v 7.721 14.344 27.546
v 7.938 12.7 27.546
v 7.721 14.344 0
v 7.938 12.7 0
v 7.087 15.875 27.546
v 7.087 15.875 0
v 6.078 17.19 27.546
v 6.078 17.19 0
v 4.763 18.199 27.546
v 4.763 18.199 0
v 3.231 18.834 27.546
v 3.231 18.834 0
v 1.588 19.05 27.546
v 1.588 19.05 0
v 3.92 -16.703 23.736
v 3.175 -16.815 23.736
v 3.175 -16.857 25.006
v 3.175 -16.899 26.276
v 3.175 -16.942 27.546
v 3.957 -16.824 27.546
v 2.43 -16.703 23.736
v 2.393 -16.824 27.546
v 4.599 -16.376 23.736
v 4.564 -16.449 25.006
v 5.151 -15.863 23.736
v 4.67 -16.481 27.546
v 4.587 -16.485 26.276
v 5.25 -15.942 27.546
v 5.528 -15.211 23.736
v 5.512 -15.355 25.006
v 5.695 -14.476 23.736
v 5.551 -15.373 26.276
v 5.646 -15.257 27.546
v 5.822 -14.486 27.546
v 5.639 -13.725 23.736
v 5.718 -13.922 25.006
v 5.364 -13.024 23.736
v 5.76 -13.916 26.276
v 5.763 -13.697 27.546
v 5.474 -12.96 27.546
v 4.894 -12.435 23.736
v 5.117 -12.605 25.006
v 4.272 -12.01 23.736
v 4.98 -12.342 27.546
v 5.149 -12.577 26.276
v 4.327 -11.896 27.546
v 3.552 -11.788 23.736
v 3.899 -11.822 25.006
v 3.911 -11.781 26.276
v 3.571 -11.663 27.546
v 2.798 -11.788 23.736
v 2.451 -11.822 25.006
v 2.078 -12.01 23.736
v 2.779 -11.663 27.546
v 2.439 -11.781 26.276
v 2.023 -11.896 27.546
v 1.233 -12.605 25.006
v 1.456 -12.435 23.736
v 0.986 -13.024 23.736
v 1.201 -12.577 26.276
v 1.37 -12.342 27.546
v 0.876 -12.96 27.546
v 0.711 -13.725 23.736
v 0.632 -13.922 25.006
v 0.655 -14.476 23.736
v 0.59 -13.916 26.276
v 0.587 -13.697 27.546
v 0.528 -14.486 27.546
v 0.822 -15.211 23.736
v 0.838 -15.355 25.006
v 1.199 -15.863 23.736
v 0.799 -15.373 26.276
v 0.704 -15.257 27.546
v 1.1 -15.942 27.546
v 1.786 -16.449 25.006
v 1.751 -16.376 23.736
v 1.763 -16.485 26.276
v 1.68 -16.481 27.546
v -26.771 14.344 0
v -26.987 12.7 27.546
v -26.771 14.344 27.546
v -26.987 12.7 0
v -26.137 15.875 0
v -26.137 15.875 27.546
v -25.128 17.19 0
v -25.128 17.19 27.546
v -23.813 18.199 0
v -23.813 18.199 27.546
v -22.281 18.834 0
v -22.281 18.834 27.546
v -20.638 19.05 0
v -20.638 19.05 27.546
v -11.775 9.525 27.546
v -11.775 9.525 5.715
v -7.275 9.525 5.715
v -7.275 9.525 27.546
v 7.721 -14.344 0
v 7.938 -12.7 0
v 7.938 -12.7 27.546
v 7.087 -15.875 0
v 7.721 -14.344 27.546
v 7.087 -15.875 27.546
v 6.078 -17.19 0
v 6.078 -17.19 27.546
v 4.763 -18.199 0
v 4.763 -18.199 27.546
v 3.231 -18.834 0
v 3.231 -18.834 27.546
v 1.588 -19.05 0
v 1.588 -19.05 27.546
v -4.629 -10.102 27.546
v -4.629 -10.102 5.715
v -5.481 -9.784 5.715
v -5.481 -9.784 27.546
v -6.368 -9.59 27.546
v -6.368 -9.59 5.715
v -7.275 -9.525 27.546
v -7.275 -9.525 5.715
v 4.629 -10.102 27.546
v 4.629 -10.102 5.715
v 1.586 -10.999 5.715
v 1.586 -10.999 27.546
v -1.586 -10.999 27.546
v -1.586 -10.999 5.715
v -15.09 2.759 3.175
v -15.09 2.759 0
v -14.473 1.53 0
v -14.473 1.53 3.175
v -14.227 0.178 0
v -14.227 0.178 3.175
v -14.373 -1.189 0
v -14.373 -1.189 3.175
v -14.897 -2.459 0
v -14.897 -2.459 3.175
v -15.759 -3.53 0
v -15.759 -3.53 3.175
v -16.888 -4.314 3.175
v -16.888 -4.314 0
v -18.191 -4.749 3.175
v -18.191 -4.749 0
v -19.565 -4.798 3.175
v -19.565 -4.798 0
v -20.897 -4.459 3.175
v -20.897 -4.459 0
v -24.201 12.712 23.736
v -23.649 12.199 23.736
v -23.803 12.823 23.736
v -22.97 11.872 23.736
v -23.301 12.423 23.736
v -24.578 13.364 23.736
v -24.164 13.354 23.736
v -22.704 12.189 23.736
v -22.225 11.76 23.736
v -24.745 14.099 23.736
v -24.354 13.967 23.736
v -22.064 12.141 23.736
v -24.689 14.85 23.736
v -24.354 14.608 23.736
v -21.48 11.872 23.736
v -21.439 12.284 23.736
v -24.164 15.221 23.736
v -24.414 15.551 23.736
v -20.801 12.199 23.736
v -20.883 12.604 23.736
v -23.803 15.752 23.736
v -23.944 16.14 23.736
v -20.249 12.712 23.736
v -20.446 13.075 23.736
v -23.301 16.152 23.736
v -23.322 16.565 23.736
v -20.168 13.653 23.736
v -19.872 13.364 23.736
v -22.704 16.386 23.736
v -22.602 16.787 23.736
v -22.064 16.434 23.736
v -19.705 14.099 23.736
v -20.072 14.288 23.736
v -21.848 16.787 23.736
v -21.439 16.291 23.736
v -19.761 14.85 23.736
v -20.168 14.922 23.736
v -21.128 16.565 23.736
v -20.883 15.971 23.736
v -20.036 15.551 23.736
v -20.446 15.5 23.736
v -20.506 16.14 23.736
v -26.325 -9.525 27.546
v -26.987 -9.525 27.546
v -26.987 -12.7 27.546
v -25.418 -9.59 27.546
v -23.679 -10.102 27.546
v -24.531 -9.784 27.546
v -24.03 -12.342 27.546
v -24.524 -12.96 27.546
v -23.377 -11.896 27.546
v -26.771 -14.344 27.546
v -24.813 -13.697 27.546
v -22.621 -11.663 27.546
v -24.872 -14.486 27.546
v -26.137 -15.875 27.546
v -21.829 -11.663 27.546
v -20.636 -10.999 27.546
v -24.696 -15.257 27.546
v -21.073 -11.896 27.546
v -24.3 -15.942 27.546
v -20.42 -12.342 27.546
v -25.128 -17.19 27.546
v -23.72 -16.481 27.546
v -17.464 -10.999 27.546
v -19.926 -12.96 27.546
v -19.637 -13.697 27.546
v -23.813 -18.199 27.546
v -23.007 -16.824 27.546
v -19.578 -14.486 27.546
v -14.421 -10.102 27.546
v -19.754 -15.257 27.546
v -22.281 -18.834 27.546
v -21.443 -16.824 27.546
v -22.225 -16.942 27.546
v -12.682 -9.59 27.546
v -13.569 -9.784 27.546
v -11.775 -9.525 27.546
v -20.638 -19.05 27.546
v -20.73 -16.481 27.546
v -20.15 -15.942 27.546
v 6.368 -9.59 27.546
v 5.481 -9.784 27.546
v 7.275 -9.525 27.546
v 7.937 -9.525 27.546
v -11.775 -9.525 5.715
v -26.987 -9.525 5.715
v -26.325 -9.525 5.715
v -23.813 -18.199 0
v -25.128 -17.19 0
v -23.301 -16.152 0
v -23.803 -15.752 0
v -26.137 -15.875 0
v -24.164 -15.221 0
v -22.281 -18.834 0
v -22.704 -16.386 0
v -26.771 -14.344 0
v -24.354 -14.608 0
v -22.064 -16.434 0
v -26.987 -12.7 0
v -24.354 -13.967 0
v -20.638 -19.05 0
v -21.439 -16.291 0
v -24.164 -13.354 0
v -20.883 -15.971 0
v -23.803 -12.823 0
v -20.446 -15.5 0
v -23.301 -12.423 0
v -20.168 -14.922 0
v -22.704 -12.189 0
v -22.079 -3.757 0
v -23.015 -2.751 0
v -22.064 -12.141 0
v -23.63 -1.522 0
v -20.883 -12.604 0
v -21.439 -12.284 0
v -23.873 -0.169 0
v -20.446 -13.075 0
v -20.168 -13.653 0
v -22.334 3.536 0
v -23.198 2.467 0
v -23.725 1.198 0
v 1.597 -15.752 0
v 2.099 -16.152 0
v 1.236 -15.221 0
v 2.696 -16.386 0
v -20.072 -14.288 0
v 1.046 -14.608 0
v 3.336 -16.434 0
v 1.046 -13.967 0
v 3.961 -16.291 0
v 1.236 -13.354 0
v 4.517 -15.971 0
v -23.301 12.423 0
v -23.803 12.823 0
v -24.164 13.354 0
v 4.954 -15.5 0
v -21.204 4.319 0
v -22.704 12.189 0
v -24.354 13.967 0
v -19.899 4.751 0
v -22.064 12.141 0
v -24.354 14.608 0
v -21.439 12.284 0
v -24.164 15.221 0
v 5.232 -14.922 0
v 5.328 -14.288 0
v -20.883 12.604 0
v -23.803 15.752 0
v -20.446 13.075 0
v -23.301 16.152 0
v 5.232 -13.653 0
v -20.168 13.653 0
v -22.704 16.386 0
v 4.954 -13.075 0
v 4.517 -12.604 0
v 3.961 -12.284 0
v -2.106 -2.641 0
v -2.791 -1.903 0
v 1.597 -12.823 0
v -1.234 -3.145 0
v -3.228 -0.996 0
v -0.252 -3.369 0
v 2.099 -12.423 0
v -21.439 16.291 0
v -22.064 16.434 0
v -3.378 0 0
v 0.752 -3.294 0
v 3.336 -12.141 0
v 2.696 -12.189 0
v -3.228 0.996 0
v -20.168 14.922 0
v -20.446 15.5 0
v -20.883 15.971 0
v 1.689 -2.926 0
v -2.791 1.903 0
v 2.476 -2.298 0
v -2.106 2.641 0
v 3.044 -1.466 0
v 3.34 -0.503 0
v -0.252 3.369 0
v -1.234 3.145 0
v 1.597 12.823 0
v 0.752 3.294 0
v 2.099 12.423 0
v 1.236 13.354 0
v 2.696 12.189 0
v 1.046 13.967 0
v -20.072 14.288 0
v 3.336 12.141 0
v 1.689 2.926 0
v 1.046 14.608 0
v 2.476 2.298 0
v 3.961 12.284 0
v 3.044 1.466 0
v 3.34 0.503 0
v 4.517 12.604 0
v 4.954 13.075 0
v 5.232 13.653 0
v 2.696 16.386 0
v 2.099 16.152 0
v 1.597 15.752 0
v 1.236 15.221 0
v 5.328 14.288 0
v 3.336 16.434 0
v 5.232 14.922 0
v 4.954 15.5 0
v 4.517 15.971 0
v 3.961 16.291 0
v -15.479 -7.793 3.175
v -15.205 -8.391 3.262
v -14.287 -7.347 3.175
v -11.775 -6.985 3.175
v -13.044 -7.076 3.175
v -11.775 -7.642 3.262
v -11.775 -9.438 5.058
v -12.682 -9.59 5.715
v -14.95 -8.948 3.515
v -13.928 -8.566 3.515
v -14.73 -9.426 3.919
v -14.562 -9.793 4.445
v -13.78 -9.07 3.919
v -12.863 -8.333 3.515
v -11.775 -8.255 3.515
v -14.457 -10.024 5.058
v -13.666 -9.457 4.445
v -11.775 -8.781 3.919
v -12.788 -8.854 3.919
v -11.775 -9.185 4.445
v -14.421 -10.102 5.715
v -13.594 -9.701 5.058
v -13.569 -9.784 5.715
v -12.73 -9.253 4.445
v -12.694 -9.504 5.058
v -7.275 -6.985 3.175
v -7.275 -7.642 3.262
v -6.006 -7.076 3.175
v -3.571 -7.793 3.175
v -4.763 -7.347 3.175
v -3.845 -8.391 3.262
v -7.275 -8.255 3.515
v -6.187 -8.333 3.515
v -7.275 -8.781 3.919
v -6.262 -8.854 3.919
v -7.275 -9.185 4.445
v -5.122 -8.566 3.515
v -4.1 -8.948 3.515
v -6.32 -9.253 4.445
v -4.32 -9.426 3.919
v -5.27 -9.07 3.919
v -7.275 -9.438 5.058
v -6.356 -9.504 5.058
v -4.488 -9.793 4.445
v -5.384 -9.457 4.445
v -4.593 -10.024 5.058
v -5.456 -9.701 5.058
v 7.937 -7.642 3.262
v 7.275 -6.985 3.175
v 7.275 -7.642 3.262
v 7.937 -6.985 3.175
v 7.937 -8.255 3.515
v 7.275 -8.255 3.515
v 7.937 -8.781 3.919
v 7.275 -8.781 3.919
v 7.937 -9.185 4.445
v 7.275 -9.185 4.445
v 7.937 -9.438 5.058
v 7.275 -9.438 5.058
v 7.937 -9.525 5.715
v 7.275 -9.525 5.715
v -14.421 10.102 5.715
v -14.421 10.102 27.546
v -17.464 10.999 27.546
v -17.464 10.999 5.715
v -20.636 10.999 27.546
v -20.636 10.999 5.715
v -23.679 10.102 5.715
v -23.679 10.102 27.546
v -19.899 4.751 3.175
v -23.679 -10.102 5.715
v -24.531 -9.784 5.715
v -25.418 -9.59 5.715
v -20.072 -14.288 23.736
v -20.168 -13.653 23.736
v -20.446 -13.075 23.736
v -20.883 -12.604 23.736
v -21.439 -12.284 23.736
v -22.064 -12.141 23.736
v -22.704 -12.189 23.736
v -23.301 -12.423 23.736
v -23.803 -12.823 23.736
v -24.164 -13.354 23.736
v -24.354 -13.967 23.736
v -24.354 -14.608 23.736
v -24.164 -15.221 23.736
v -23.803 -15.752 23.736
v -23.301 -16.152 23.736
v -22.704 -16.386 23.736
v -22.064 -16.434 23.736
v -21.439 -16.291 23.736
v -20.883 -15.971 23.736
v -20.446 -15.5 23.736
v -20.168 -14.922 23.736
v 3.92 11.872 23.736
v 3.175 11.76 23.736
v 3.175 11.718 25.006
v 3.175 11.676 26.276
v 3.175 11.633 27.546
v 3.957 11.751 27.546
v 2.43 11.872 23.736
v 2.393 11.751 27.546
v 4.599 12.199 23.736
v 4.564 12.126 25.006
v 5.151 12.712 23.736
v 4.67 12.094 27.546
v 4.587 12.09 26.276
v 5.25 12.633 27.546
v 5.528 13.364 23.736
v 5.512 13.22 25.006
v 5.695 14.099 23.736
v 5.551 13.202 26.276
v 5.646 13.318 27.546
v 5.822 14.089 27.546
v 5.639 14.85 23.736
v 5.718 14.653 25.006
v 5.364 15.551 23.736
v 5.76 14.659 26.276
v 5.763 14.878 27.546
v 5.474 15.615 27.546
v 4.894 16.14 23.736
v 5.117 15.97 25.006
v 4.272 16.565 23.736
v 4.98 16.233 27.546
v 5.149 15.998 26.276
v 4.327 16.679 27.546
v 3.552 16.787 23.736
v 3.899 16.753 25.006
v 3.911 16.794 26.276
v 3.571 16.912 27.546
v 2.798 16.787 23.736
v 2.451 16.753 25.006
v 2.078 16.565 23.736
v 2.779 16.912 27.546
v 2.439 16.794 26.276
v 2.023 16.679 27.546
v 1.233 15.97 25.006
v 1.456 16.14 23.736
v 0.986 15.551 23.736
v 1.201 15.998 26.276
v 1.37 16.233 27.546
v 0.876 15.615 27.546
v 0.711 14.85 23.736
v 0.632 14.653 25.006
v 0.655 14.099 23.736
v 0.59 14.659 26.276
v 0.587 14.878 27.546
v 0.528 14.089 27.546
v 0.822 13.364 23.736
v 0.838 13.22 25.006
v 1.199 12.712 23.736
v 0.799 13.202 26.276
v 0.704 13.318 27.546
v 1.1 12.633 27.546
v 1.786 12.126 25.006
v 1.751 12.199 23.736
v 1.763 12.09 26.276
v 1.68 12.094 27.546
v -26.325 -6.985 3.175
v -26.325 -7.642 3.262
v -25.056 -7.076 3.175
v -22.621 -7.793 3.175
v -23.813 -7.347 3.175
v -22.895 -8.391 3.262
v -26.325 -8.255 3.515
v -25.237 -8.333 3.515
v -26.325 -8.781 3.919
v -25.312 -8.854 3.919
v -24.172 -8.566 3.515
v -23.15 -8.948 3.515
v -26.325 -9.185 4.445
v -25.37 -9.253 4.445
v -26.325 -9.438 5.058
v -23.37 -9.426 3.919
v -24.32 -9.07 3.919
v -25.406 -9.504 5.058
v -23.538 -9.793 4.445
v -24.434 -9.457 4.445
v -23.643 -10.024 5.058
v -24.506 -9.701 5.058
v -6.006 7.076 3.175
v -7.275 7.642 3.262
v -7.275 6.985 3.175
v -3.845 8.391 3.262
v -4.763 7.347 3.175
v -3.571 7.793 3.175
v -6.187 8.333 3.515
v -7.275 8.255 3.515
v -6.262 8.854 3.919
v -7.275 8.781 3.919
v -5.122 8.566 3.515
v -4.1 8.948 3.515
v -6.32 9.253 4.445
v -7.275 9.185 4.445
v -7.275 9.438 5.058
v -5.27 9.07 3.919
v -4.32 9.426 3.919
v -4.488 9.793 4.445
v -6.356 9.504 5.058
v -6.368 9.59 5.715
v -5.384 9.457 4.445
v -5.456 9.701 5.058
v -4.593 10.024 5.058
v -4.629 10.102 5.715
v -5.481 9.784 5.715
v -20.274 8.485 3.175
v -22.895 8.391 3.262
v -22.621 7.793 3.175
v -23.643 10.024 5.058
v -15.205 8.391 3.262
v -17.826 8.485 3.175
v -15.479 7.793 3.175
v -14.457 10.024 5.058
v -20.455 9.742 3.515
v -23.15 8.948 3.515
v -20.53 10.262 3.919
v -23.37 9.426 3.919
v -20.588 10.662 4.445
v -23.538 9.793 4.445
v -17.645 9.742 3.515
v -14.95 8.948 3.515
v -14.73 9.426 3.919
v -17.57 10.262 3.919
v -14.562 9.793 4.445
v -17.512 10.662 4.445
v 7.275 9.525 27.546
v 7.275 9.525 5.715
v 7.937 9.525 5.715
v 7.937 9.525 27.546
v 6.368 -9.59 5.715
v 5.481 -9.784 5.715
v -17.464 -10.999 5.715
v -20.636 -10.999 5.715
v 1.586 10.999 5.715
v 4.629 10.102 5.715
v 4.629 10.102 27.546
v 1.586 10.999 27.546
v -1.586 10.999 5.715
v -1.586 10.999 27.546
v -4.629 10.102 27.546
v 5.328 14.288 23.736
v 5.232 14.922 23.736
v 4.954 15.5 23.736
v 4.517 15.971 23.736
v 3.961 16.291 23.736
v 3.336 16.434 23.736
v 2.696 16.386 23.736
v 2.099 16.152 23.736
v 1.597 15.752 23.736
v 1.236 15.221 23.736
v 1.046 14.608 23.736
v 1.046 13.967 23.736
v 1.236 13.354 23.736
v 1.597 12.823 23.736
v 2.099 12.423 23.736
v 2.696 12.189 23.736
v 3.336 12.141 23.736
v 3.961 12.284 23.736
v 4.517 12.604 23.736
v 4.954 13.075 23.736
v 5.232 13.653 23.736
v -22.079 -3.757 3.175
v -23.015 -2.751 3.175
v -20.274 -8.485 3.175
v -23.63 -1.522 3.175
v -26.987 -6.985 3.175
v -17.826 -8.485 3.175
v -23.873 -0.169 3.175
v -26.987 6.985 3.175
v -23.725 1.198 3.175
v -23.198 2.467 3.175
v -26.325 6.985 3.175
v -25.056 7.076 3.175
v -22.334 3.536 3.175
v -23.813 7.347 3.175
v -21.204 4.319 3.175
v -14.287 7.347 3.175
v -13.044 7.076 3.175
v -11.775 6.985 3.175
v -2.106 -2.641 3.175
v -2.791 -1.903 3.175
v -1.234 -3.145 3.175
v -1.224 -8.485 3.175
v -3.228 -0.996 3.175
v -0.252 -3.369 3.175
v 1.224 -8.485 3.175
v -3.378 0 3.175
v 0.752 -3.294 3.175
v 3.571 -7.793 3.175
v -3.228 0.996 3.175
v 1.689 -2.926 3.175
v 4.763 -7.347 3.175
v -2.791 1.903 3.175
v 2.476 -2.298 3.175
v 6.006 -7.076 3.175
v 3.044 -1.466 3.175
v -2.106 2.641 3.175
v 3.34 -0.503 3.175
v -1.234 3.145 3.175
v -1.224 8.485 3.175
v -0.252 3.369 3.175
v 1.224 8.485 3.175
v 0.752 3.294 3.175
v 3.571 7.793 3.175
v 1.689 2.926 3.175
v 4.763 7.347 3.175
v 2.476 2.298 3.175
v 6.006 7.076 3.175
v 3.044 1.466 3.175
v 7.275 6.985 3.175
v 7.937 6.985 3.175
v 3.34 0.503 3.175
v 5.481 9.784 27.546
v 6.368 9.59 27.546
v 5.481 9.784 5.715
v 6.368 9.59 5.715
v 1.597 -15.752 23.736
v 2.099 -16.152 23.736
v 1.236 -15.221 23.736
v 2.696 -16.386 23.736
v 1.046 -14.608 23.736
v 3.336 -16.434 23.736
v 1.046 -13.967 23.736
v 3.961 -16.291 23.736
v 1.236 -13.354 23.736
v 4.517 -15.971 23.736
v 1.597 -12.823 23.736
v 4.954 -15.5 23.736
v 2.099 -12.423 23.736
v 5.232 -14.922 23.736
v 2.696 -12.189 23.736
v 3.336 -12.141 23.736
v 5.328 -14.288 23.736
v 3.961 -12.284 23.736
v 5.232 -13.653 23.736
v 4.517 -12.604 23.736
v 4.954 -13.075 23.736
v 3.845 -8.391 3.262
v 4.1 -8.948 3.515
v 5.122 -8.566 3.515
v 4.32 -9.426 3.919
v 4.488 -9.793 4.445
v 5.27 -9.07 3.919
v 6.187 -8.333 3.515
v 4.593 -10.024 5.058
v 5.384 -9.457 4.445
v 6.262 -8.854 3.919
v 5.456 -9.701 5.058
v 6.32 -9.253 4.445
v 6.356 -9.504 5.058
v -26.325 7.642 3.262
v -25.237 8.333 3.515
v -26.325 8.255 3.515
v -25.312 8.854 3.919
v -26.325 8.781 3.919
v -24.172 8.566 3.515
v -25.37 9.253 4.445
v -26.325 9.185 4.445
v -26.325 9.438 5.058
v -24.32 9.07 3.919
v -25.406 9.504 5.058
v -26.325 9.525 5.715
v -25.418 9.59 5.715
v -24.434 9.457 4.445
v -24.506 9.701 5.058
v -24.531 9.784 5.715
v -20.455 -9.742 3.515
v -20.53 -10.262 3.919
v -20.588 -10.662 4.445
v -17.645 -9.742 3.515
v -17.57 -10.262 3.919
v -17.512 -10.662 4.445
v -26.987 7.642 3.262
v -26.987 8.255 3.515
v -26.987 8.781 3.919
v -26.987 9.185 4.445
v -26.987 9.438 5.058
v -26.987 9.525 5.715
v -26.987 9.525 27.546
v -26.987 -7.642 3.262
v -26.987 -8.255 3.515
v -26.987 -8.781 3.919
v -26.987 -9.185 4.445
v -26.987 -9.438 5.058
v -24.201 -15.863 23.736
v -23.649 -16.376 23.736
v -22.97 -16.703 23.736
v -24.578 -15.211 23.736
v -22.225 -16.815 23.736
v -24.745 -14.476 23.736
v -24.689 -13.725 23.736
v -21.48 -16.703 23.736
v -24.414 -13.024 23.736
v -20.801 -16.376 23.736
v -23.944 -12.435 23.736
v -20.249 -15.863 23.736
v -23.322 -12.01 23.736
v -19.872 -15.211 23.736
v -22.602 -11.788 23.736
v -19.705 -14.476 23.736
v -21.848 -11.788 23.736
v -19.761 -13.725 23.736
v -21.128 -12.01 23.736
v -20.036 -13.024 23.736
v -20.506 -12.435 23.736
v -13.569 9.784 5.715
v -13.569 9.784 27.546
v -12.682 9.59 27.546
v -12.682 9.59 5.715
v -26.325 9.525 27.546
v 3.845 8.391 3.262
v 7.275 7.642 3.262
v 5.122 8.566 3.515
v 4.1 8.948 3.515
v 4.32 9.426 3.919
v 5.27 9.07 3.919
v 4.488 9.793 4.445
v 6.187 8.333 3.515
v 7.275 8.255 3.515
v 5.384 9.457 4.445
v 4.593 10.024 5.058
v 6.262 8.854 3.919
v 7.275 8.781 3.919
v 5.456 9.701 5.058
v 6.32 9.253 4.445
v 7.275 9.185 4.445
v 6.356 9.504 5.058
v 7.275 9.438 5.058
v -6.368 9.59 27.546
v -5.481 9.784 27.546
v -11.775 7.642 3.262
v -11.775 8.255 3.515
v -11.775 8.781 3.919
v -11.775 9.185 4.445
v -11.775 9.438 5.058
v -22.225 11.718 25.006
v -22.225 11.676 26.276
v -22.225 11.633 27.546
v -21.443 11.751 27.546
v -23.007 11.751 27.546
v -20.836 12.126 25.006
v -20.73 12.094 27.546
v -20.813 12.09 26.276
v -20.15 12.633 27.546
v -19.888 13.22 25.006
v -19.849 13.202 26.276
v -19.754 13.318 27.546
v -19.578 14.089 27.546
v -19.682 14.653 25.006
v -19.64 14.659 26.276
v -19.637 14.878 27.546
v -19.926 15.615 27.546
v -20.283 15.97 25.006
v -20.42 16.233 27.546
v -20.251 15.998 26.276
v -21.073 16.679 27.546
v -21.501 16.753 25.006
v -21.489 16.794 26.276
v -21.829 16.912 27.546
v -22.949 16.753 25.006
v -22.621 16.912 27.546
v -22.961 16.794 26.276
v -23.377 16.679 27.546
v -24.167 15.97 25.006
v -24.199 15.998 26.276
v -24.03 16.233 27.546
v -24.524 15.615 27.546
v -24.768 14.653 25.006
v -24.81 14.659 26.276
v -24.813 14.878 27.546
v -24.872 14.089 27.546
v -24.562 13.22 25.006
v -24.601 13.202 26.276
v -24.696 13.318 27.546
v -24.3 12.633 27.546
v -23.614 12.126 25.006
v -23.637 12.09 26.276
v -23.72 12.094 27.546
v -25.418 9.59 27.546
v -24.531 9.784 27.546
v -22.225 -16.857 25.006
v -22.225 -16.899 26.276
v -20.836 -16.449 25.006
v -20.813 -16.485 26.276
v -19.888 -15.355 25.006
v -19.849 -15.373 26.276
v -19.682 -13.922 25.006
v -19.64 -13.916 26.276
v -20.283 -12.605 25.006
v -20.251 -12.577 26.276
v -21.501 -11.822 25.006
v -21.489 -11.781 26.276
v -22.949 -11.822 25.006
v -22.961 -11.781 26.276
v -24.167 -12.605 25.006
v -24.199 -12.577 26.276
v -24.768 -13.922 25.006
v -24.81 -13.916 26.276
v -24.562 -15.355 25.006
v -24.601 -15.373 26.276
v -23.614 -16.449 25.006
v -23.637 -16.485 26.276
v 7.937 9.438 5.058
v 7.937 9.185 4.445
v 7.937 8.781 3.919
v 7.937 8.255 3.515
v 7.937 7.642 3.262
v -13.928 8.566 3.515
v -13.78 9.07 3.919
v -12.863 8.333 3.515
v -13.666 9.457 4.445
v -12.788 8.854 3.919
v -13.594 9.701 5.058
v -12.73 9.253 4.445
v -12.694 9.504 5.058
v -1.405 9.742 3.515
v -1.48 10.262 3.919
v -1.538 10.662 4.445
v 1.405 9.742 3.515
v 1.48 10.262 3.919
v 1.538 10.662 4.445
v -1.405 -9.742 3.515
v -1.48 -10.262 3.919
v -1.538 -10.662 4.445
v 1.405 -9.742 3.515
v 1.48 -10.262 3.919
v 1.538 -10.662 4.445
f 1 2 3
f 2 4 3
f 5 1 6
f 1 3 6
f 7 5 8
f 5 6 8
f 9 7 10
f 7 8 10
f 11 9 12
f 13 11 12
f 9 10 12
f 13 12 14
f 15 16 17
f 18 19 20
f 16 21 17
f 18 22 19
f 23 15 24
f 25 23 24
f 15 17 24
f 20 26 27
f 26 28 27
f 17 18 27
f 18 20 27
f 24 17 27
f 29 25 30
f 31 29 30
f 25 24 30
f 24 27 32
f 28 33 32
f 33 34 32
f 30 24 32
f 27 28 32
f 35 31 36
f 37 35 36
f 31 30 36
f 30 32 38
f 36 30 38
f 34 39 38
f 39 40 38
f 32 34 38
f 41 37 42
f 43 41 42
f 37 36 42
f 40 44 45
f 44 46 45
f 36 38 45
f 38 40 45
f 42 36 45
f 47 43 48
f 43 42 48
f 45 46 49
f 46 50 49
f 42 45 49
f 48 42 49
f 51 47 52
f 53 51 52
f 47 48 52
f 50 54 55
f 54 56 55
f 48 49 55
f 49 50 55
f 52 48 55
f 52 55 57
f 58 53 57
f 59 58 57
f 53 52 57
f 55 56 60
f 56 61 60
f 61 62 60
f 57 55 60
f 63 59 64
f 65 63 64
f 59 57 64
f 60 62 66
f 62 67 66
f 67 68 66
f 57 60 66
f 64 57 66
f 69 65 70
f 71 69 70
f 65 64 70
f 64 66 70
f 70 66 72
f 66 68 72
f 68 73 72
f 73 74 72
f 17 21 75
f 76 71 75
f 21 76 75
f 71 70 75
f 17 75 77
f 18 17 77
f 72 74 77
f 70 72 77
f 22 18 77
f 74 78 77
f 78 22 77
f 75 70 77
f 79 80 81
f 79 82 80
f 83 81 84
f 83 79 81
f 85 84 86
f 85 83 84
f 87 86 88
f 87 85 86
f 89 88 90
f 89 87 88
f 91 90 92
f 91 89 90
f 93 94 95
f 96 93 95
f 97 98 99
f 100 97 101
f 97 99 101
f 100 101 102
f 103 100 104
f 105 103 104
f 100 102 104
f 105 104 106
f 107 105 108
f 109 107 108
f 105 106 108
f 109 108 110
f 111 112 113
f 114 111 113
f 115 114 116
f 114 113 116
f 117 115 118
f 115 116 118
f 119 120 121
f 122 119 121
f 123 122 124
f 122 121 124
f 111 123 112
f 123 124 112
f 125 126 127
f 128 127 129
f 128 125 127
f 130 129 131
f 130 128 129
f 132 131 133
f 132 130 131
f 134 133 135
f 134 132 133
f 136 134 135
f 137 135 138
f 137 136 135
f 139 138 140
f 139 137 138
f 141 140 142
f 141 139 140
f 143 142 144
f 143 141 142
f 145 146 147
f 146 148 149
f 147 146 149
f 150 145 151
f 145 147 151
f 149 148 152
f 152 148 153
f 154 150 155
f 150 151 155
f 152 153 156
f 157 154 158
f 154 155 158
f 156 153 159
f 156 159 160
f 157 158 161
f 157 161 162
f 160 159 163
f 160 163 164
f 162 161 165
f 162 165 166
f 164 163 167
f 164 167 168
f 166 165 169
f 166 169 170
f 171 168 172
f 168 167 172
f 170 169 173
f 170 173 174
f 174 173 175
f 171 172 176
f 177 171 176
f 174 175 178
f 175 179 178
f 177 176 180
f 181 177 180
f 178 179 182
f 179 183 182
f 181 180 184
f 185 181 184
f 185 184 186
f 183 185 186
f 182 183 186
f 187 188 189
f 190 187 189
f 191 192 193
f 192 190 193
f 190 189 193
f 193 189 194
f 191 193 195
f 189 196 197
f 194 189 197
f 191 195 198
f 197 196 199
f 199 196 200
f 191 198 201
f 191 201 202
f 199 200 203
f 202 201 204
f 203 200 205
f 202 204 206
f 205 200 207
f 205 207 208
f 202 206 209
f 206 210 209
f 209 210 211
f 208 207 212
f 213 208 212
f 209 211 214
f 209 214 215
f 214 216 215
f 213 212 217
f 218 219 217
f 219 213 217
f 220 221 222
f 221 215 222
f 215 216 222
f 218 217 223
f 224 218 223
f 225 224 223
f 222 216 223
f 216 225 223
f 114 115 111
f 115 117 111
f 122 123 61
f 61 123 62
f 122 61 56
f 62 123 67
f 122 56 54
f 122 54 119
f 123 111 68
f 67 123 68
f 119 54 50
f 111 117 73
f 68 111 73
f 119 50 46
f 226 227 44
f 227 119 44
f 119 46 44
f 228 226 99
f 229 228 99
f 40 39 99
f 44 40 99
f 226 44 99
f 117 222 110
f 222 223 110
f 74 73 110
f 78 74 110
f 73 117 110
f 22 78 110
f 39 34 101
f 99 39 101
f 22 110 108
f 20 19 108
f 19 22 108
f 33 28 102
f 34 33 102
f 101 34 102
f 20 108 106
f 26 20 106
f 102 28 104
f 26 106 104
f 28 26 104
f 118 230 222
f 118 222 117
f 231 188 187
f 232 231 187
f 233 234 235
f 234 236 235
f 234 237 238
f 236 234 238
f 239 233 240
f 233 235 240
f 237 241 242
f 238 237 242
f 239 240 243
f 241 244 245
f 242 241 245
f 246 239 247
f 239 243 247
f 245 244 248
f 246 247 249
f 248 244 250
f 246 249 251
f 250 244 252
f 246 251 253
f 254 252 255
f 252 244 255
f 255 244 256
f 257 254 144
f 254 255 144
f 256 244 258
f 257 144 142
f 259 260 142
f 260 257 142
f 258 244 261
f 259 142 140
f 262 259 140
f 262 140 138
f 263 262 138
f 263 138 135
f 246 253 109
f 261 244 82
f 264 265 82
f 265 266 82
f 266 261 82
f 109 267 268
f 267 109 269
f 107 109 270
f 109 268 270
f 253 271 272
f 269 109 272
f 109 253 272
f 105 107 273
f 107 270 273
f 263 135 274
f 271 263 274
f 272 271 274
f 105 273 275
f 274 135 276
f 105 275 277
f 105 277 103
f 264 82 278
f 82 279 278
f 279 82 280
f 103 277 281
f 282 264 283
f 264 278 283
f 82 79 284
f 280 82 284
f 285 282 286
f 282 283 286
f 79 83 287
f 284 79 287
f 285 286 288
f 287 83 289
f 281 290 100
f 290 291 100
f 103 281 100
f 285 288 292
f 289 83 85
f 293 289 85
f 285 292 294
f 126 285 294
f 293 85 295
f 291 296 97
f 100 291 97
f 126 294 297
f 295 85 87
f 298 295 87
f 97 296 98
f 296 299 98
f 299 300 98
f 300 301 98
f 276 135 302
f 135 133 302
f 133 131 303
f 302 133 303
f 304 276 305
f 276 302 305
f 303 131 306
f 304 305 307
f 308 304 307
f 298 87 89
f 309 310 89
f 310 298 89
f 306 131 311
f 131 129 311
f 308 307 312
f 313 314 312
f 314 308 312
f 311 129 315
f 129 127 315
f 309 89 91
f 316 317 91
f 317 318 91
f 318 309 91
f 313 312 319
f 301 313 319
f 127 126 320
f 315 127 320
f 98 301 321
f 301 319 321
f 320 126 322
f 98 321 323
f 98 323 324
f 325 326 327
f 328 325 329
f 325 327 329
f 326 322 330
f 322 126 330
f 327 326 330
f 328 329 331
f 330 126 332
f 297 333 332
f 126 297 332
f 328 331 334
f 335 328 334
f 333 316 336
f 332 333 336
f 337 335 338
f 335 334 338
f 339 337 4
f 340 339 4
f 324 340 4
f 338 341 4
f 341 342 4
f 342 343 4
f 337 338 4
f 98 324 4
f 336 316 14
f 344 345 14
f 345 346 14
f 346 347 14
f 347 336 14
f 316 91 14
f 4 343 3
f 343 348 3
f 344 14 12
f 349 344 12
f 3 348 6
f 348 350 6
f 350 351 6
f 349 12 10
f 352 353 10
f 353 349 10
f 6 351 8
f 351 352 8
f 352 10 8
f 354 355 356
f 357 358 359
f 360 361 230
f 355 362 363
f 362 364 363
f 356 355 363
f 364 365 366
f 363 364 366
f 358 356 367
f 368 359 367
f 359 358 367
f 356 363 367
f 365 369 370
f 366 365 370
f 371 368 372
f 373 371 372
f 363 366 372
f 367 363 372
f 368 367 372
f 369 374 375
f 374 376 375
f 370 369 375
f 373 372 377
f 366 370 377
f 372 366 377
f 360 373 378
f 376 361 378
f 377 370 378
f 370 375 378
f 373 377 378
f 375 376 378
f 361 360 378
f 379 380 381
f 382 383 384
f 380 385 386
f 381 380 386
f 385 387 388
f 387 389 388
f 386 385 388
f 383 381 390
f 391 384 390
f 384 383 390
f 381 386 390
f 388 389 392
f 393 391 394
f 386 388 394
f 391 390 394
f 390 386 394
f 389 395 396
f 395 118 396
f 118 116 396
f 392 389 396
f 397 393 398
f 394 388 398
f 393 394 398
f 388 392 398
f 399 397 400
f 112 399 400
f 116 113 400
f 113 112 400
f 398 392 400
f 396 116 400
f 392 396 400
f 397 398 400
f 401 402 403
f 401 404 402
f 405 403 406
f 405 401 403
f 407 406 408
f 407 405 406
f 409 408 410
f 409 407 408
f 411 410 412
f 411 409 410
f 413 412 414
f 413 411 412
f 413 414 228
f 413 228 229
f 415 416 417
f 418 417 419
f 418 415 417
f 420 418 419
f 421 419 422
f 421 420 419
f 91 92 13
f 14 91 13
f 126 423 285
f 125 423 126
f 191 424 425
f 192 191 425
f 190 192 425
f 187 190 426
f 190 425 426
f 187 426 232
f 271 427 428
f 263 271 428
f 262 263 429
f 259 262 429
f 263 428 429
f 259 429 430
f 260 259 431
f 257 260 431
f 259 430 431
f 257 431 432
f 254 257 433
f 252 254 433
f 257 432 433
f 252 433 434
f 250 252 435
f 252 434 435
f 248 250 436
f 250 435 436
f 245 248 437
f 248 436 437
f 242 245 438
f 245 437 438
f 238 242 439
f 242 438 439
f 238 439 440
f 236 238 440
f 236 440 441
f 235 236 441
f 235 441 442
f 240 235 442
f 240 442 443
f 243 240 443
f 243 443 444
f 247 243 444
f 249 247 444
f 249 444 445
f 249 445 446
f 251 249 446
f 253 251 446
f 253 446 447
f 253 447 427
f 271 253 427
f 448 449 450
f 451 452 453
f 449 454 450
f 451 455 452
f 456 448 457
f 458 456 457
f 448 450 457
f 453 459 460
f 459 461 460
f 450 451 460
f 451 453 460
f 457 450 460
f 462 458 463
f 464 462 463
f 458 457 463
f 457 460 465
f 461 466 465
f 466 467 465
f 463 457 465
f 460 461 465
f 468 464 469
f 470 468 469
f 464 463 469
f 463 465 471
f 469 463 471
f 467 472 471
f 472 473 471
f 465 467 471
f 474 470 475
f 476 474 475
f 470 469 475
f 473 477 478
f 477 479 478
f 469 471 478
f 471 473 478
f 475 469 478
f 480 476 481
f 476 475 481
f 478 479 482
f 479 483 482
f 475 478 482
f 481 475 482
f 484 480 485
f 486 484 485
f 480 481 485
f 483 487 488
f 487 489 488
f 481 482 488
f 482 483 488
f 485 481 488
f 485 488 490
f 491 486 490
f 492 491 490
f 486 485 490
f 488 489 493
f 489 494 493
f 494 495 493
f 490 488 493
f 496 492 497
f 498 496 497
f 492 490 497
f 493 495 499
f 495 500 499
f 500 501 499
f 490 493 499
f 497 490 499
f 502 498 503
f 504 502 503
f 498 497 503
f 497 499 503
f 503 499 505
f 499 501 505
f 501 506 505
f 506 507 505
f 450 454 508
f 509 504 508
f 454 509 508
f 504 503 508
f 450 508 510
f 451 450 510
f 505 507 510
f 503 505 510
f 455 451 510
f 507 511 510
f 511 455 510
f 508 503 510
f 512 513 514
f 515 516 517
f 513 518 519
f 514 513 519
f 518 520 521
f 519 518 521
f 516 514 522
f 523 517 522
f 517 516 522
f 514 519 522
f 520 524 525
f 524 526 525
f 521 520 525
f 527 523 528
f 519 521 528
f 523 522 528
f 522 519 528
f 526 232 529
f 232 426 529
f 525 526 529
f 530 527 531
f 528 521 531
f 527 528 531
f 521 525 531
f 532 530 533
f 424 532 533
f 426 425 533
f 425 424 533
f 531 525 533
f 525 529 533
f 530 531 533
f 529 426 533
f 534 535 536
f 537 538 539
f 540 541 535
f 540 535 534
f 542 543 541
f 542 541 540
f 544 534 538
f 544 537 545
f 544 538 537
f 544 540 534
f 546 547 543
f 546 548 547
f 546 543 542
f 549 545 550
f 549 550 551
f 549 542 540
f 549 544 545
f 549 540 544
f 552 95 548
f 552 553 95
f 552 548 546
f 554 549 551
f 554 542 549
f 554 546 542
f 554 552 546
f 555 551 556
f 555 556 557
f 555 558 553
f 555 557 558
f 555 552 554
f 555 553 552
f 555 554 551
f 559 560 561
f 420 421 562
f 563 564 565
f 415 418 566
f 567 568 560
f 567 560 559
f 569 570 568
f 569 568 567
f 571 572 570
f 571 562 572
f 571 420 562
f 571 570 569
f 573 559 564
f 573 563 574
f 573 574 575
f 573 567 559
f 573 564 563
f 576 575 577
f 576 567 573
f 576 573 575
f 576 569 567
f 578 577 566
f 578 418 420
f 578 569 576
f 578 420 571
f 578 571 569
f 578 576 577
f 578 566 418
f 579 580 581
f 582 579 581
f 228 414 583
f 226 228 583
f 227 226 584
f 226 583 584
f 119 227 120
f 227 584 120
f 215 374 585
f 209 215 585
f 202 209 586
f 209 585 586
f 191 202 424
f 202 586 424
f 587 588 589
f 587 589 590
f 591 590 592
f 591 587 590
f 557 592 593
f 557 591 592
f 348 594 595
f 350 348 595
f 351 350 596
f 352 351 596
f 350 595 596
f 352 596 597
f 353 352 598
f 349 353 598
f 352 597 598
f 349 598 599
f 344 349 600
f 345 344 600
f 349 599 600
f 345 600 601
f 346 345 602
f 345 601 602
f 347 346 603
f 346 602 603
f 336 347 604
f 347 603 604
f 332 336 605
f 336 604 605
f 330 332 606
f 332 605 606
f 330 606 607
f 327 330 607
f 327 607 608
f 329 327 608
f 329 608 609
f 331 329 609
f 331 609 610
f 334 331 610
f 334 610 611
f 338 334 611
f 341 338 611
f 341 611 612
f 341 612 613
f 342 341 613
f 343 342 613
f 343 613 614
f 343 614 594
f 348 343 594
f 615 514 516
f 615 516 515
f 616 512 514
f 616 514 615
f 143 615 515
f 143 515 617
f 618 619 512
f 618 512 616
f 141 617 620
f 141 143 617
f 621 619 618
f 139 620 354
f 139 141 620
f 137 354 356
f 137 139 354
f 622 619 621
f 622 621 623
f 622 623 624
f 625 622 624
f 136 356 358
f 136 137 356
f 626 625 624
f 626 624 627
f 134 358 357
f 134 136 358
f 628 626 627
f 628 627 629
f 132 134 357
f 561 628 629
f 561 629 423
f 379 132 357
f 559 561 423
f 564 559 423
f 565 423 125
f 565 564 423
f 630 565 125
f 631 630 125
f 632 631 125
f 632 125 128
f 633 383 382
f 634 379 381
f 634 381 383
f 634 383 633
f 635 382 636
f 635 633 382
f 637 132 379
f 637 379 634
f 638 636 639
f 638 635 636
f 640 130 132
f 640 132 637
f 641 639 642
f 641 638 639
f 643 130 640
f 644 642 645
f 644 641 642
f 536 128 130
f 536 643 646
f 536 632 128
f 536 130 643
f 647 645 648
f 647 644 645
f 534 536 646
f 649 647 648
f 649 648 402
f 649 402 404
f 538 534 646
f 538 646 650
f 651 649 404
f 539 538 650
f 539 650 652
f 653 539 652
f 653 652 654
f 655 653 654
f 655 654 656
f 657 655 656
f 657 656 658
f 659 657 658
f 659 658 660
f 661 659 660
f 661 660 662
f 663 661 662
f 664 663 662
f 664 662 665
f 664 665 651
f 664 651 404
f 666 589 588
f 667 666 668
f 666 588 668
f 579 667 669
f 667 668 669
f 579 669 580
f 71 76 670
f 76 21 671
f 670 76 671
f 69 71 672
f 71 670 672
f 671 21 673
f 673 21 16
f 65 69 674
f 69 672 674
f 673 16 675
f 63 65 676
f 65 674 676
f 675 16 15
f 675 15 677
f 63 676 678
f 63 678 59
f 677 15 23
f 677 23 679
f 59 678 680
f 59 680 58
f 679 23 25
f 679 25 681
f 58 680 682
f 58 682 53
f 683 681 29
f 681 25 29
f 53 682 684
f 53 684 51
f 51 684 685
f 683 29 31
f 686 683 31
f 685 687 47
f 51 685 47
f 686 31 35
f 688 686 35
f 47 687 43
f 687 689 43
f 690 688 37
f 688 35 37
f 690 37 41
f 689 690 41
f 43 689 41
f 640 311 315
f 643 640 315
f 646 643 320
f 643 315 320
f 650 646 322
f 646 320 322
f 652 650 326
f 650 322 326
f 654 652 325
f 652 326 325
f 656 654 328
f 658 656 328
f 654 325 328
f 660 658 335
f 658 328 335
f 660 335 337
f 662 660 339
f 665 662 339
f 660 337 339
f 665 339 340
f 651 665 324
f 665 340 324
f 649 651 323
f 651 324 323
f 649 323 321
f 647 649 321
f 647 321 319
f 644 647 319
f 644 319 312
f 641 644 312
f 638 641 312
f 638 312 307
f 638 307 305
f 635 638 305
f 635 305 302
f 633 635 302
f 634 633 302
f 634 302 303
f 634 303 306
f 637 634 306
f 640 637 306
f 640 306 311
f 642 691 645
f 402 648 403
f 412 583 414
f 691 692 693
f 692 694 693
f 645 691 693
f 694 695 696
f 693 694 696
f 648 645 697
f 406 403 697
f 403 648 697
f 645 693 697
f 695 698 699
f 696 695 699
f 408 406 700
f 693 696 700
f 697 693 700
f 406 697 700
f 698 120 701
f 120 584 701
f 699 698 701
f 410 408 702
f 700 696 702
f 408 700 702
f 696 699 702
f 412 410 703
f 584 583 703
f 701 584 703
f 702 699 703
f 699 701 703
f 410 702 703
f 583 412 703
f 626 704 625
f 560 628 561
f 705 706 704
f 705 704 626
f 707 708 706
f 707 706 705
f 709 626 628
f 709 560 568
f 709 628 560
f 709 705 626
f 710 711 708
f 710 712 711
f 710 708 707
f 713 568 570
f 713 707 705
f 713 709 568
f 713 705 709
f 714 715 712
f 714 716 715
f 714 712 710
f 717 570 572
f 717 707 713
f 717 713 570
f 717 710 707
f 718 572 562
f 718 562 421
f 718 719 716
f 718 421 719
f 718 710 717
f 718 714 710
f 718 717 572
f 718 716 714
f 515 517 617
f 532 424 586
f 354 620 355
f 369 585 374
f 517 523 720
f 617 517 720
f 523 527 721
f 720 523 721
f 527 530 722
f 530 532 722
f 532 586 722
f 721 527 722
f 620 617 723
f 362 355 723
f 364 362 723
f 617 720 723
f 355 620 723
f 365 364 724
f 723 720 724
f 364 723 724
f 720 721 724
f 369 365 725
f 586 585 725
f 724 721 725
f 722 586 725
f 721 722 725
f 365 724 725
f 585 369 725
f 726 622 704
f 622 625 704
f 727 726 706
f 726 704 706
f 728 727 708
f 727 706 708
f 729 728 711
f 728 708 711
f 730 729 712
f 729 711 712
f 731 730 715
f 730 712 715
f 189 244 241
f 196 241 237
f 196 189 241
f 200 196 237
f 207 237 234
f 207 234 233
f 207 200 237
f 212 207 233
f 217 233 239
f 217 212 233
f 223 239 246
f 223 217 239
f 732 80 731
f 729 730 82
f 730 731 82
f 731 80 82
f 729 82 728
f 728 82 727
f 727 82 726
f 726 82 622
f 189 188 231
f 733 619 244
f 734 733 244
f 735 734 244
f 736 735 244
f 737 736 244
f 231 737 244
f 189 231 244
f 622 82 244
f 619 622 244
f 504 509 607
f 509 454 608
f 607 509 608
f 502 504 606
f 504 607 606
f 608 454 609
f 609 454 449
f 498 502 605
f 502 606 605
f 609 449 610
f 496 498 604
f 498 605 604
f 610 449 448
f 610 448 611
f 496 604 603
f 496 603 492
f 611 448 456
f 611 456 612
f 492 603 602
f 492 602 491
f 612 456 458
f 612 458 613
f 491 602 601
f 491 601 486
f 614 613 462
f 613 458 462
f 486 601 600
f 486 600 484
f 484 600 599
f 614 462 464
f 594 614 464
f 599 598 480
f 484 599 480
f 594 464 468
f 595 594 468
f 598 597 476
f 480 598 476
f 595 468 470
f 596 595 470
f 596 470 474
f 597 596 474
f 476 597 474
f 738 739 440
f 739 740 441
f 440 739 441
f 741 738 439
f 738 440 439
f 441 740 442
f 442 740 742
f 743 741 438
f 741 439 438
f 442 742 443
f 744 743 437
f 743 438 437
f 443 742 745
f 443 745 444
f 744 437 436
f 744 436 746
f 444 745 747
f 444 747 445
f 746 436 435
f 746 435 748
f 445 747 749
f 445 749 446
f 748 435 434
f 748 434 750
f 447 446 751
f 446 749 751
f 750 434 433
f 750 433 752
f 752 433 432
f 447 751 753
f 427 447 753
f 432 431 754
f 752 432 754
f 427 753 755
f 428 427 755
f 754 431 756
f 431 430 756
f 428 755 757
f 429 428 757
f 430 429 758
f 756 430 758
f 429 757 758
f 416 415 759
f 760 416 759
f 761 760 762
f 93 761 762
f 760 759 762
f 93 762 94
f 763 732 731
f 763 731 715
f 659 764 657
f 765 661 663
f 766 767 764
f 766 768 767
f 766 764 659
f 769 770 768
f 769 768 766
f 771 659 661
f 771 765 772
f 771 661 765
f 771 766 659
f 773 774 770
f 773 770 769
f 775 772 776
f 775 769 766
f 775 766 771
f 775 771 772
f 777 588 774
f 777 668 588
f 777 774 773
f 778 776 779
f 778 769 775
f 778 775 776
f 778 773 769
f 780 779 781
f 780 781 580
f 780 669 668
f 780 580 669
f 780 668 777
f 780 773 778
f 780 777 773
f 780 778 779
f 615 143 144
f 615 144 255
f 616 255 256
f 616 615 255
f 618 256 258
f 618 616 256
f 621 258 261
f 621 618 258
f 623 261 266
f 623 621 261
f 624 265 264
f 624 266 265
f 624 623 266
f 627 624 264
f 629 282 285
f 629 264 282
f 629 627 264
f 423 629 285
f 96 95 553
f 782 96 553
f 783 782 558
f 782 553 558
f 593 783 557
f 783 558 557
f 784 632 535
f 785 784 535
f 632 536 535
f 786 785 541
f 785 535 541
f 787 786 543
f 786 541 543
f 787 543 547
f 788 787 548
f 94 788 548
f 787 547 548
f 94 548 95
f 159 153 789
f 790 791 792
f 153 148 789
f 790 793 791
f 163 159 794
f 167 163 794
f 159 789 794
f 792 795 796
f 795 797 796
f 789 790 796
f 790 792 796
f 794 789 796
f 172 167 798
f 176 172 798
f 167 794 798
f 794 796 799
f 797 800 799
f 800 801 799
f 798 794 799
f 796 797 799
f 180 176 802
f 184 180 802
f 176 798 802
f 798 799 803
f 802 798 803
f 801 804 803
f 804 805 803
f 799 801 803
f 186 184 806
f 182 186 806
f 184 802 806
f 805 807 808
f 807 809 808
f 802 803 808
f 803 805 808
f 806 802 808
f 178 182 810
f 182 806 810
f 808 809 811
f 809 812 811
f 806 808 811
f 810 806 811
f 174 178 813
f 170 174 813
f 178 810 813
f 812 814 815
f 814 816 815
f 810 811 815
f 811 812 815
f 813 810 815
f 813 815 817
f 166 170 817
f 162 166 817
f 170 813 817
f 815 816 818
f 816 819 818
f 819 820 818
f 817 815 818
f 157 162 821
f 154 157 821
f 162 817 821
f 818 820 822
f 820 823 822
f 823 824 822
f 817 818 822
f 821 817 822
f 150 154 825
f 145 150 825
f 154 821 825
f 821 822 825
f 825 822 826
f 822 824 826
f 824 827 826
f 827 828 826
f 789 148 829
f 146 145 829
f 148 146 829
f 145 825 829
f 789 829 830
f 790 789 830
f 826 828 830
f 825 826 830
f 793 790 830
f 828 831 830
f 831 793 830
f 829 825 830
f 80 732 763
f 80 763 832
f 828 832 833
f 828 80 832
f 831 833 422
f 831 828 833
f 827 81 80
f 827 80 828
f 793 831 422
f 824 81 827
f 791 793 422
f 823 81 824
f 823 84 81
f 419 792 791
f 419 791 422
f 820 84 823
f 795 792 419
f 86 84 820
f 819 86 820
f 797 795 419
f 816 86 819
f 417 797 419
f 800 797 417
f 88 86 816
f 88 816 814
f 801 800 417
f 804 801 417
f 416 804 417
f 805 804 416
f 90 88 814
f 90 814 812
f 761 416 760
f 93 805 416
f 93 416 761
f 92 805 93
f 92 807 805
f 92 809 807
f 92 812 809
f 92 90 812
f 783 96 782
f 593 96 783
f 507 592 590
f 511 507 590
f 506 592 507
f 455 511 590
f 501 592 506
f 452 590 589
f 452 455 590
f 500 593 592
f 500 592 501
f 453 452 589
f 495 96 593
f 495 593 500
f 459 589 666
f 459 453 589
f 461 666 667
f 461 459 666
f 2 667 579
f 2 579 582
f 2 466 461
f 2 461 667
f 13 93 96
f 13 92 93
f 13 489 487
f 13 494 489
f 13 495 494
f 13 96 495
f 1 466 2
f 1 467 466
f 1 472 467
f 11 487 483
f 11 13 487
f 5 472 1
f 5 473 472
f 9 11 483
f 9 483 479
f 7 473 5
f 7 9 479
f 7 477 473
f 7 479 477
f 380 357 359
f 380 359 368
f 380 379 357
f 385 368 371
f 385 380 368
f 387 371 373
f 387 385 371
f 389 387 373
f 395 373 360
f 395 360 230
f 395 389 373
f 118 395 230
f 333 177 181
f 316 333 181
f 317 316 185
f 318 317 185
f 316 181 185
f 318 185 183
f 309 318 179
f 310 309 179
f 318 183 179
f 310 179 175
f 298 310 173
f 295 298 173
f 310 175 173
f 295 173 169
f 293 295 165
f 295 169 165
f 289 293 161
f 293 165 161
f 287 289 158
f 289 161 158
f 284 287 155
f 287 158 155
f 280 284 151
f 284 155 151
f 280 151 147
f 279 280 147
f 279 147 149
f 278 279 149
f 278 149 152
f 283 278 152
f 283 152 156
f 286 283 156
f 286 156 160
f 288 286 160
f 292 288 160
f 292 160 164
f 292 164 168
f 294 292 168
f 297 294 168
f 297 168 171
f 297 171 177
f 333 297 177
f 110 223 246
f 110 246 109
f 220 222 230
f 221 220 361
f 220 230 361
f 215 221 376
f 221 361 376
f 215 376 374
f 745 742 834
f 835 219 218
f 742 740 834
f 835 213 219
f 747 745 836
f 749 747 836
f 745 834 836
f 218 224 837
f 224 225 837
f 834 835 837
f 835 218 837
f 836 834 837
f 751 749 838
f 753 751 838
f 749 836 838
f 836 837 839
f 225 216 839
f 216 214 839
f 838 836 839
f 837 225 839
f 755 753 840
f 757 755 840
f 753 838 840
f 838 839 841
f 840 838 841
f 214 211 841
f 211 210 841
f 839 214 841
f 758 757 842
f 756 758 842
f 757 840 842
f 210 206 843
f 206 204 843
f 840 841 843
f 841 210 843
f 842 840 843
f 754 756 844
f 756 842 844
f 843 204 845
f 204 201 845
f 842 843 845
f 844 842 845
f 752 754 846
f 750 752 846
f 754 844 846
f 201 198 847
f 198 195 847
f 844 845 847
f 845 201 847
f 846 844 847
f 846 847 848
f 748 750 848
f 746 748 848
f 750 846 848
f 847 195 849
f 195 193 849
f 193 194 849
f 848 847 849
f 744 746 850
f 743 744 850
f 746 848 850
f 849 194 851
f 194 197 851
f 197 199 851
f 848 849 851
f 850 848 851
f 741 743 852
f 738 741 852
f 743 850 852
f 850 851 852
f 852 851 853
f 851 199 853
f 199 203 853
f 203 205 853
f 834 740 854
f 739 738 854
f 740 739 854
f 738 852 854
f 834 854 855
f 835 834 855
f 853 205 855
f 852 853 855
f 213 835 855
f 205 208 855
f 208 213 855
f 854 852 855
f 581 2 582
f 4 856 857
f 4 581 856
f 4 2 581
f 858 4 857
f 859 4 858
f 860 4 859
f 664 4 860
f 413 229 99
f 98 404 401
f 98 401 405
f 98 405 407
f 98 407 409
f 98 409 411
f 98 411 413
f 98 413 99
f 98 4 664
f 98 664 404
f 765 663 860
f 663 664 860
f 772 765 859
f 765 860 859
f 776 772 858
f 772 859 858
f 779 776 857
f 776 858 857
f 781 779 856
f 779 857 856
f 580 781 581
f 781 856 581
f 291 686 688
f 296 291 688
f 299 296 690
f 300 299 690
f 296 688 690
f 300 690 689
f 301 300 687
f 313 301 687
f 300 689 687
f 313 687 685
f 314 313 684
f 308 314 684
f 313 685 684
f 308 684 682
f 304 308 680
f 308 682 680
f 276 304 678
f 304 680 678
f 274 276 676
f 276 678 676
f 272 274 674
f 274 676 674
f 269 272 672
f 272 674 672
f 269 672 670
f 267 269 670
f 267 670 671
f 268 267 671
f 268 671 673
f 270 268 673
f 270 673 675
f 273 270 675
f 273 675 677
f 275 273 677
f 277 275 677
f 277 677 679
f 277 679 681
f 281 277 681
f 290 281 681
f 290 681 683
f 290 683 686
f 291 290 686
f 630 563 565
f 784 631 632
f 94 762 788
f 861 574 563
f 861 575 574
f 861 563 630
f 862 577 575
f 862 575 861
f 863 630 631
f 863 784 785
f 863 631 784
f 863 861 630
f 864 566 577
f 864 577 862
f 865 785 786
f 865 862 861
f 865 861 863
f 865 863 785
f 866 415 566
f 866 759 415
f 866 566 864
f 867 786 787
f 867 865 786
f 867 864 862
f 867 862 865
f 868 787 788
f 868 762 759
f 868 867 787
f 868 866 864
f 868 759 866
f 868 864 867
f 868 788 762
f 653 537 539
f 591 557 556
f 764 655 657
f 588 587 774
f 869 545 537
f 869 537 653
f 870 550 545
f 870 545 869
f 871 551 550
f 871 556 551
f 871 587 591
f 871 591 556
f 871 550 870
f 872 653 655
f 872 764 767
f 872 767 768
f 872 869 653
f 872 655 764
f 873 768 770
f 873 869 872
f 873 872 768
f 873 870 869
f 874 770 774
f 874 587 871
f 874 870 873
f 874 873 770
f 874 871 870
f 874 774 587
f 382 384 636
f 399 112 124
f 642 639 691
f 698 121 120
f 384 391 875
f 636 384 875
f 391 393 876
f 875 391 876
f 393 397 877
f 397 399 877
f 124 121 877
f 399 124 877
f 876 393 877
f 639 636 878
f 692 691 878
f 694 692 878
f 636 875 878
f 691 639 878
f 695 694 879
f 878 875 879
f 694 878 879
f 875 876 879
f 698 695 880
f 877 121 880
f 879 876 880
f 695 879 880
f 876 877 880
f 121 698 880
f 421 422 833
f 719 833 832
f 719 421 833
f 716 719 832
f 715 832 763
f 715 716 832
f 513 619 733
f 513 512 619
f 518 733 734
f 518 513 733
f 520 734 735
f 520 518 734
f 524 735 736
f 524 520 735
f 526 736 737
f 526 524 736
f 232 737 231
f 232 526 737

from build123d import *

# Parameters (mm, degrees)
SKETCH1_W               = 34.925
SKETCH1_H               = 38.1
BOSS_EXTRUDE1_DEPTH     = 3.175
SKETCH2_W               = 34.925
SKETCH2_H               = 9.525
BOSS_EXTRUDE2_DEPTH     = 24.3713
CUT_EXTRUDE1_START      = -16.4338
SKETCH3_R               = 11.1125
CUT_EXTRUDE1_DEPTH      = 25.3713
FILLET1_R               = 6.35
FILLET2_R               = 2.54
CUT_EXTRUDE2_DEPTH      = 4.175
F_1_4_CLEARANCE_HOLE1_D = 6.7564
F_6_CLEARANCE_HOLE1_D   = 4.3053
HOLE1_AT_2_COUNT        = 2
HOLE1_AT_2_PITCH        = 25.4
HOLE1_AT_3_COUNT        = 2
HOLE1_AT_3_PITCH        = 28.575
HOLE1_AT_4_COUNT        = 2
HOLE1_AT_4_PITCH        = 38.232062788


with BuildPart() as part:
    # Sketch1 → Boss-Extrude1 (new body)
    with BuildSketch(Plane.XY):
        with Locations((-9.525, 0)):
            Rectangle(SKETCH1_W, SKETCH1_H)
    extrude(amount=BOSS_EXTRUDE1_DEPTH)

    # Sketch2 → Boss-Extrude2 (add)
    with BuildSketch(Plane.XY.offset(3.175)):
        with Locations((-9.525, 14.2875)):
            Rectangle(SKETCH2_W, SKETCH2_H)
    boss_extrude2 = extrude(amount=BOSS_EXTRUDE2_DEPTH)

    # Sketch3 → Cut-Extrude1 (cut)
    with BuildSketch(Plane.XY.offset(19.6088).offset(CUT_EXTRUDE1_START)):
        Circle(SKETCH3_R)
        with Locations((-19.05, 0)):
            Circle(SKETCH3_R)
    cut_extrude1 = extrude(amount=CUT_EXTRUDE1_DEPTH, mode=Mode.SUBTRACT)

    # Mirror1: Boss-Extrude2, Cut-Extrude1 across plane
    add(boss_extrude2.mirror(Plane.ZX))
    add(cut_extrude1.mirror(Plane.ZX), mode=Mode.SUBTRACT)

    # Fillet1
    fillet1_edges = [part.edges().sort_by_distance(p)[0] for p in [
        (7.9375, 19.05, 13.77315),
        (-26.9875, 19.05, 13.77315),
        (5.72381265, 9.525, 15.36065),
        (-5.72381265, 9.525, 15.36065),
        (-13.32618735, 9.525, 15.36065),
        (-24.77381265, 9.525, 15.36065),
        (7.9375, -19.05, 13.77315),
        (-26.9875, -19.05, 13.77315),
        (5.72381265, -9.525, 15.36065),
        (-5.72381265, -9.525, 15.36065),
        (-13.32618735, -9.525, 15.36065),
        (-24.77381265, -9.525, 15.36065),
    ]]
    fillet(fillet1_edges, radius=FILLET1_R)

    # Fillet2
    fillet2_edges = [part.edges().sort_by_distance(p)[0] for p in [
        (7.606169458, 9.525, 3.175),
        (5.921014367, 9.670996527, 3.175),
        (0, 11.1125, 3.175),
        (-5.921014367, 9.670996527, 3.175),
        (-13.128985633, 9.670996527, 3.175),
        (-19.05, 11.1125, 3.175),
        (-24.971014367, 9.670996527, 3.175),
        (-26.656169458, 9.525, 3.175),
        (-9.525, 9.525, 3.175),
        (7.606169458, -9.525, 3.175),
        (5.921014367, -9.670996527, 3.175),
        (0, -11.1125, 3.175),
        (-5.921014367, -9.670996527, 3.175),
        (-9.525, -9.525, 3.175),
        (-13.128985633, -9.670996527, 3.175),
        (-19.05, -11.1125, 3.175),
        (-24.971014367, -9.670996527, 3.175),
        (-26.656169458, -9.525, 3.175),
    ]]
    fillet(fillet2_edges, radius=FILLET2_R)

    # Sketch4 → Cut-Extrude2 (cut, through all)
    with BuildSketch(Plane.XY.offset(3.175)):
        with BuildLine():
            Line((-19.899380011, 4.750666227), (-15.090170105, 2.758627051))
            ThreePointArc((-15.090170105, 2.758627051), (-15.28988845, -3.025200346), (-20.896829618, -4.458642883))
            ThreePointArc((-20.896829618, -4.458642883), (-23.8479402, 0.519659348), (-19.899380011, 4.750666227))
        make_face()
    extrude(amount=-CUT_EXTRUDE2_DEPTH, mode=Mode.SUBTRACT)

    # 1/4 Clearance Hole1 (through all)
    with Locations(Plane.XY.offset(3.175)):
        with Locations((0, 0)):
            Hole(F_1_4_CLEARANCE_HOLE1_D / 2)

    # #6 Clearance Hole1 (through all)
    with Locations(Plane(origin=(0, 0, 0), x_dir=(-1, 0, 0), z_dir=(0, 0, -1))):
        with Locations((-3.175, 14.2875), (22.225, 14.2875), (22.225, -14.2875), (-3.175, -14.2875)):
            Hole(F_6_CLEARANCE_HOLE1_D / 2)

    # Sketch9 → Hole1 (revolve, cut)
    with BuildSketch(Plane(origin=(-22.225, 14.2875, 27.5463), x_dir=(0, -1, 0), z_dir=(1, 0, 0))):
        Polygon((0, 0), (0, 3.81), (2.5273, 3.81), (2.6543, 0), align=None)
    hole1 = revolve(axis=Axis((-22.225, 14.2875, -82.4537), (0, 0, 1)), mode=Mode.SUBTRACT)

    # Hole1 at 2: Hole1 ×2
    with Locations(*[(i * HOLE1_AT_2_PITCH, 0, 0) for i in range(1, HOLE1_AT_2_COUNT)]):
        add(hole1, mode=Mode.SUBTRACT)

    # Hole1 at 3: Hole1 ×2
    with Locations(*[(0, -i * HOLE1_AT_3_PITCH, 0) for i in range(1, HOLE1_AT_3_COUNT)]):
        add(hole1, mode=Mode.SUBTRACT)

    # Hole1 at 4: Hole1 ×2
    with Locations(*[Vector(0.664363839, -0.747409319, 0) * (i * HOLE1_AT_4_PITCH) for i in range(1, HOLE1_AT_4_COUNT)]):
        add(hole1, mode=Mode.SUBTRACT)


solid = part.part
